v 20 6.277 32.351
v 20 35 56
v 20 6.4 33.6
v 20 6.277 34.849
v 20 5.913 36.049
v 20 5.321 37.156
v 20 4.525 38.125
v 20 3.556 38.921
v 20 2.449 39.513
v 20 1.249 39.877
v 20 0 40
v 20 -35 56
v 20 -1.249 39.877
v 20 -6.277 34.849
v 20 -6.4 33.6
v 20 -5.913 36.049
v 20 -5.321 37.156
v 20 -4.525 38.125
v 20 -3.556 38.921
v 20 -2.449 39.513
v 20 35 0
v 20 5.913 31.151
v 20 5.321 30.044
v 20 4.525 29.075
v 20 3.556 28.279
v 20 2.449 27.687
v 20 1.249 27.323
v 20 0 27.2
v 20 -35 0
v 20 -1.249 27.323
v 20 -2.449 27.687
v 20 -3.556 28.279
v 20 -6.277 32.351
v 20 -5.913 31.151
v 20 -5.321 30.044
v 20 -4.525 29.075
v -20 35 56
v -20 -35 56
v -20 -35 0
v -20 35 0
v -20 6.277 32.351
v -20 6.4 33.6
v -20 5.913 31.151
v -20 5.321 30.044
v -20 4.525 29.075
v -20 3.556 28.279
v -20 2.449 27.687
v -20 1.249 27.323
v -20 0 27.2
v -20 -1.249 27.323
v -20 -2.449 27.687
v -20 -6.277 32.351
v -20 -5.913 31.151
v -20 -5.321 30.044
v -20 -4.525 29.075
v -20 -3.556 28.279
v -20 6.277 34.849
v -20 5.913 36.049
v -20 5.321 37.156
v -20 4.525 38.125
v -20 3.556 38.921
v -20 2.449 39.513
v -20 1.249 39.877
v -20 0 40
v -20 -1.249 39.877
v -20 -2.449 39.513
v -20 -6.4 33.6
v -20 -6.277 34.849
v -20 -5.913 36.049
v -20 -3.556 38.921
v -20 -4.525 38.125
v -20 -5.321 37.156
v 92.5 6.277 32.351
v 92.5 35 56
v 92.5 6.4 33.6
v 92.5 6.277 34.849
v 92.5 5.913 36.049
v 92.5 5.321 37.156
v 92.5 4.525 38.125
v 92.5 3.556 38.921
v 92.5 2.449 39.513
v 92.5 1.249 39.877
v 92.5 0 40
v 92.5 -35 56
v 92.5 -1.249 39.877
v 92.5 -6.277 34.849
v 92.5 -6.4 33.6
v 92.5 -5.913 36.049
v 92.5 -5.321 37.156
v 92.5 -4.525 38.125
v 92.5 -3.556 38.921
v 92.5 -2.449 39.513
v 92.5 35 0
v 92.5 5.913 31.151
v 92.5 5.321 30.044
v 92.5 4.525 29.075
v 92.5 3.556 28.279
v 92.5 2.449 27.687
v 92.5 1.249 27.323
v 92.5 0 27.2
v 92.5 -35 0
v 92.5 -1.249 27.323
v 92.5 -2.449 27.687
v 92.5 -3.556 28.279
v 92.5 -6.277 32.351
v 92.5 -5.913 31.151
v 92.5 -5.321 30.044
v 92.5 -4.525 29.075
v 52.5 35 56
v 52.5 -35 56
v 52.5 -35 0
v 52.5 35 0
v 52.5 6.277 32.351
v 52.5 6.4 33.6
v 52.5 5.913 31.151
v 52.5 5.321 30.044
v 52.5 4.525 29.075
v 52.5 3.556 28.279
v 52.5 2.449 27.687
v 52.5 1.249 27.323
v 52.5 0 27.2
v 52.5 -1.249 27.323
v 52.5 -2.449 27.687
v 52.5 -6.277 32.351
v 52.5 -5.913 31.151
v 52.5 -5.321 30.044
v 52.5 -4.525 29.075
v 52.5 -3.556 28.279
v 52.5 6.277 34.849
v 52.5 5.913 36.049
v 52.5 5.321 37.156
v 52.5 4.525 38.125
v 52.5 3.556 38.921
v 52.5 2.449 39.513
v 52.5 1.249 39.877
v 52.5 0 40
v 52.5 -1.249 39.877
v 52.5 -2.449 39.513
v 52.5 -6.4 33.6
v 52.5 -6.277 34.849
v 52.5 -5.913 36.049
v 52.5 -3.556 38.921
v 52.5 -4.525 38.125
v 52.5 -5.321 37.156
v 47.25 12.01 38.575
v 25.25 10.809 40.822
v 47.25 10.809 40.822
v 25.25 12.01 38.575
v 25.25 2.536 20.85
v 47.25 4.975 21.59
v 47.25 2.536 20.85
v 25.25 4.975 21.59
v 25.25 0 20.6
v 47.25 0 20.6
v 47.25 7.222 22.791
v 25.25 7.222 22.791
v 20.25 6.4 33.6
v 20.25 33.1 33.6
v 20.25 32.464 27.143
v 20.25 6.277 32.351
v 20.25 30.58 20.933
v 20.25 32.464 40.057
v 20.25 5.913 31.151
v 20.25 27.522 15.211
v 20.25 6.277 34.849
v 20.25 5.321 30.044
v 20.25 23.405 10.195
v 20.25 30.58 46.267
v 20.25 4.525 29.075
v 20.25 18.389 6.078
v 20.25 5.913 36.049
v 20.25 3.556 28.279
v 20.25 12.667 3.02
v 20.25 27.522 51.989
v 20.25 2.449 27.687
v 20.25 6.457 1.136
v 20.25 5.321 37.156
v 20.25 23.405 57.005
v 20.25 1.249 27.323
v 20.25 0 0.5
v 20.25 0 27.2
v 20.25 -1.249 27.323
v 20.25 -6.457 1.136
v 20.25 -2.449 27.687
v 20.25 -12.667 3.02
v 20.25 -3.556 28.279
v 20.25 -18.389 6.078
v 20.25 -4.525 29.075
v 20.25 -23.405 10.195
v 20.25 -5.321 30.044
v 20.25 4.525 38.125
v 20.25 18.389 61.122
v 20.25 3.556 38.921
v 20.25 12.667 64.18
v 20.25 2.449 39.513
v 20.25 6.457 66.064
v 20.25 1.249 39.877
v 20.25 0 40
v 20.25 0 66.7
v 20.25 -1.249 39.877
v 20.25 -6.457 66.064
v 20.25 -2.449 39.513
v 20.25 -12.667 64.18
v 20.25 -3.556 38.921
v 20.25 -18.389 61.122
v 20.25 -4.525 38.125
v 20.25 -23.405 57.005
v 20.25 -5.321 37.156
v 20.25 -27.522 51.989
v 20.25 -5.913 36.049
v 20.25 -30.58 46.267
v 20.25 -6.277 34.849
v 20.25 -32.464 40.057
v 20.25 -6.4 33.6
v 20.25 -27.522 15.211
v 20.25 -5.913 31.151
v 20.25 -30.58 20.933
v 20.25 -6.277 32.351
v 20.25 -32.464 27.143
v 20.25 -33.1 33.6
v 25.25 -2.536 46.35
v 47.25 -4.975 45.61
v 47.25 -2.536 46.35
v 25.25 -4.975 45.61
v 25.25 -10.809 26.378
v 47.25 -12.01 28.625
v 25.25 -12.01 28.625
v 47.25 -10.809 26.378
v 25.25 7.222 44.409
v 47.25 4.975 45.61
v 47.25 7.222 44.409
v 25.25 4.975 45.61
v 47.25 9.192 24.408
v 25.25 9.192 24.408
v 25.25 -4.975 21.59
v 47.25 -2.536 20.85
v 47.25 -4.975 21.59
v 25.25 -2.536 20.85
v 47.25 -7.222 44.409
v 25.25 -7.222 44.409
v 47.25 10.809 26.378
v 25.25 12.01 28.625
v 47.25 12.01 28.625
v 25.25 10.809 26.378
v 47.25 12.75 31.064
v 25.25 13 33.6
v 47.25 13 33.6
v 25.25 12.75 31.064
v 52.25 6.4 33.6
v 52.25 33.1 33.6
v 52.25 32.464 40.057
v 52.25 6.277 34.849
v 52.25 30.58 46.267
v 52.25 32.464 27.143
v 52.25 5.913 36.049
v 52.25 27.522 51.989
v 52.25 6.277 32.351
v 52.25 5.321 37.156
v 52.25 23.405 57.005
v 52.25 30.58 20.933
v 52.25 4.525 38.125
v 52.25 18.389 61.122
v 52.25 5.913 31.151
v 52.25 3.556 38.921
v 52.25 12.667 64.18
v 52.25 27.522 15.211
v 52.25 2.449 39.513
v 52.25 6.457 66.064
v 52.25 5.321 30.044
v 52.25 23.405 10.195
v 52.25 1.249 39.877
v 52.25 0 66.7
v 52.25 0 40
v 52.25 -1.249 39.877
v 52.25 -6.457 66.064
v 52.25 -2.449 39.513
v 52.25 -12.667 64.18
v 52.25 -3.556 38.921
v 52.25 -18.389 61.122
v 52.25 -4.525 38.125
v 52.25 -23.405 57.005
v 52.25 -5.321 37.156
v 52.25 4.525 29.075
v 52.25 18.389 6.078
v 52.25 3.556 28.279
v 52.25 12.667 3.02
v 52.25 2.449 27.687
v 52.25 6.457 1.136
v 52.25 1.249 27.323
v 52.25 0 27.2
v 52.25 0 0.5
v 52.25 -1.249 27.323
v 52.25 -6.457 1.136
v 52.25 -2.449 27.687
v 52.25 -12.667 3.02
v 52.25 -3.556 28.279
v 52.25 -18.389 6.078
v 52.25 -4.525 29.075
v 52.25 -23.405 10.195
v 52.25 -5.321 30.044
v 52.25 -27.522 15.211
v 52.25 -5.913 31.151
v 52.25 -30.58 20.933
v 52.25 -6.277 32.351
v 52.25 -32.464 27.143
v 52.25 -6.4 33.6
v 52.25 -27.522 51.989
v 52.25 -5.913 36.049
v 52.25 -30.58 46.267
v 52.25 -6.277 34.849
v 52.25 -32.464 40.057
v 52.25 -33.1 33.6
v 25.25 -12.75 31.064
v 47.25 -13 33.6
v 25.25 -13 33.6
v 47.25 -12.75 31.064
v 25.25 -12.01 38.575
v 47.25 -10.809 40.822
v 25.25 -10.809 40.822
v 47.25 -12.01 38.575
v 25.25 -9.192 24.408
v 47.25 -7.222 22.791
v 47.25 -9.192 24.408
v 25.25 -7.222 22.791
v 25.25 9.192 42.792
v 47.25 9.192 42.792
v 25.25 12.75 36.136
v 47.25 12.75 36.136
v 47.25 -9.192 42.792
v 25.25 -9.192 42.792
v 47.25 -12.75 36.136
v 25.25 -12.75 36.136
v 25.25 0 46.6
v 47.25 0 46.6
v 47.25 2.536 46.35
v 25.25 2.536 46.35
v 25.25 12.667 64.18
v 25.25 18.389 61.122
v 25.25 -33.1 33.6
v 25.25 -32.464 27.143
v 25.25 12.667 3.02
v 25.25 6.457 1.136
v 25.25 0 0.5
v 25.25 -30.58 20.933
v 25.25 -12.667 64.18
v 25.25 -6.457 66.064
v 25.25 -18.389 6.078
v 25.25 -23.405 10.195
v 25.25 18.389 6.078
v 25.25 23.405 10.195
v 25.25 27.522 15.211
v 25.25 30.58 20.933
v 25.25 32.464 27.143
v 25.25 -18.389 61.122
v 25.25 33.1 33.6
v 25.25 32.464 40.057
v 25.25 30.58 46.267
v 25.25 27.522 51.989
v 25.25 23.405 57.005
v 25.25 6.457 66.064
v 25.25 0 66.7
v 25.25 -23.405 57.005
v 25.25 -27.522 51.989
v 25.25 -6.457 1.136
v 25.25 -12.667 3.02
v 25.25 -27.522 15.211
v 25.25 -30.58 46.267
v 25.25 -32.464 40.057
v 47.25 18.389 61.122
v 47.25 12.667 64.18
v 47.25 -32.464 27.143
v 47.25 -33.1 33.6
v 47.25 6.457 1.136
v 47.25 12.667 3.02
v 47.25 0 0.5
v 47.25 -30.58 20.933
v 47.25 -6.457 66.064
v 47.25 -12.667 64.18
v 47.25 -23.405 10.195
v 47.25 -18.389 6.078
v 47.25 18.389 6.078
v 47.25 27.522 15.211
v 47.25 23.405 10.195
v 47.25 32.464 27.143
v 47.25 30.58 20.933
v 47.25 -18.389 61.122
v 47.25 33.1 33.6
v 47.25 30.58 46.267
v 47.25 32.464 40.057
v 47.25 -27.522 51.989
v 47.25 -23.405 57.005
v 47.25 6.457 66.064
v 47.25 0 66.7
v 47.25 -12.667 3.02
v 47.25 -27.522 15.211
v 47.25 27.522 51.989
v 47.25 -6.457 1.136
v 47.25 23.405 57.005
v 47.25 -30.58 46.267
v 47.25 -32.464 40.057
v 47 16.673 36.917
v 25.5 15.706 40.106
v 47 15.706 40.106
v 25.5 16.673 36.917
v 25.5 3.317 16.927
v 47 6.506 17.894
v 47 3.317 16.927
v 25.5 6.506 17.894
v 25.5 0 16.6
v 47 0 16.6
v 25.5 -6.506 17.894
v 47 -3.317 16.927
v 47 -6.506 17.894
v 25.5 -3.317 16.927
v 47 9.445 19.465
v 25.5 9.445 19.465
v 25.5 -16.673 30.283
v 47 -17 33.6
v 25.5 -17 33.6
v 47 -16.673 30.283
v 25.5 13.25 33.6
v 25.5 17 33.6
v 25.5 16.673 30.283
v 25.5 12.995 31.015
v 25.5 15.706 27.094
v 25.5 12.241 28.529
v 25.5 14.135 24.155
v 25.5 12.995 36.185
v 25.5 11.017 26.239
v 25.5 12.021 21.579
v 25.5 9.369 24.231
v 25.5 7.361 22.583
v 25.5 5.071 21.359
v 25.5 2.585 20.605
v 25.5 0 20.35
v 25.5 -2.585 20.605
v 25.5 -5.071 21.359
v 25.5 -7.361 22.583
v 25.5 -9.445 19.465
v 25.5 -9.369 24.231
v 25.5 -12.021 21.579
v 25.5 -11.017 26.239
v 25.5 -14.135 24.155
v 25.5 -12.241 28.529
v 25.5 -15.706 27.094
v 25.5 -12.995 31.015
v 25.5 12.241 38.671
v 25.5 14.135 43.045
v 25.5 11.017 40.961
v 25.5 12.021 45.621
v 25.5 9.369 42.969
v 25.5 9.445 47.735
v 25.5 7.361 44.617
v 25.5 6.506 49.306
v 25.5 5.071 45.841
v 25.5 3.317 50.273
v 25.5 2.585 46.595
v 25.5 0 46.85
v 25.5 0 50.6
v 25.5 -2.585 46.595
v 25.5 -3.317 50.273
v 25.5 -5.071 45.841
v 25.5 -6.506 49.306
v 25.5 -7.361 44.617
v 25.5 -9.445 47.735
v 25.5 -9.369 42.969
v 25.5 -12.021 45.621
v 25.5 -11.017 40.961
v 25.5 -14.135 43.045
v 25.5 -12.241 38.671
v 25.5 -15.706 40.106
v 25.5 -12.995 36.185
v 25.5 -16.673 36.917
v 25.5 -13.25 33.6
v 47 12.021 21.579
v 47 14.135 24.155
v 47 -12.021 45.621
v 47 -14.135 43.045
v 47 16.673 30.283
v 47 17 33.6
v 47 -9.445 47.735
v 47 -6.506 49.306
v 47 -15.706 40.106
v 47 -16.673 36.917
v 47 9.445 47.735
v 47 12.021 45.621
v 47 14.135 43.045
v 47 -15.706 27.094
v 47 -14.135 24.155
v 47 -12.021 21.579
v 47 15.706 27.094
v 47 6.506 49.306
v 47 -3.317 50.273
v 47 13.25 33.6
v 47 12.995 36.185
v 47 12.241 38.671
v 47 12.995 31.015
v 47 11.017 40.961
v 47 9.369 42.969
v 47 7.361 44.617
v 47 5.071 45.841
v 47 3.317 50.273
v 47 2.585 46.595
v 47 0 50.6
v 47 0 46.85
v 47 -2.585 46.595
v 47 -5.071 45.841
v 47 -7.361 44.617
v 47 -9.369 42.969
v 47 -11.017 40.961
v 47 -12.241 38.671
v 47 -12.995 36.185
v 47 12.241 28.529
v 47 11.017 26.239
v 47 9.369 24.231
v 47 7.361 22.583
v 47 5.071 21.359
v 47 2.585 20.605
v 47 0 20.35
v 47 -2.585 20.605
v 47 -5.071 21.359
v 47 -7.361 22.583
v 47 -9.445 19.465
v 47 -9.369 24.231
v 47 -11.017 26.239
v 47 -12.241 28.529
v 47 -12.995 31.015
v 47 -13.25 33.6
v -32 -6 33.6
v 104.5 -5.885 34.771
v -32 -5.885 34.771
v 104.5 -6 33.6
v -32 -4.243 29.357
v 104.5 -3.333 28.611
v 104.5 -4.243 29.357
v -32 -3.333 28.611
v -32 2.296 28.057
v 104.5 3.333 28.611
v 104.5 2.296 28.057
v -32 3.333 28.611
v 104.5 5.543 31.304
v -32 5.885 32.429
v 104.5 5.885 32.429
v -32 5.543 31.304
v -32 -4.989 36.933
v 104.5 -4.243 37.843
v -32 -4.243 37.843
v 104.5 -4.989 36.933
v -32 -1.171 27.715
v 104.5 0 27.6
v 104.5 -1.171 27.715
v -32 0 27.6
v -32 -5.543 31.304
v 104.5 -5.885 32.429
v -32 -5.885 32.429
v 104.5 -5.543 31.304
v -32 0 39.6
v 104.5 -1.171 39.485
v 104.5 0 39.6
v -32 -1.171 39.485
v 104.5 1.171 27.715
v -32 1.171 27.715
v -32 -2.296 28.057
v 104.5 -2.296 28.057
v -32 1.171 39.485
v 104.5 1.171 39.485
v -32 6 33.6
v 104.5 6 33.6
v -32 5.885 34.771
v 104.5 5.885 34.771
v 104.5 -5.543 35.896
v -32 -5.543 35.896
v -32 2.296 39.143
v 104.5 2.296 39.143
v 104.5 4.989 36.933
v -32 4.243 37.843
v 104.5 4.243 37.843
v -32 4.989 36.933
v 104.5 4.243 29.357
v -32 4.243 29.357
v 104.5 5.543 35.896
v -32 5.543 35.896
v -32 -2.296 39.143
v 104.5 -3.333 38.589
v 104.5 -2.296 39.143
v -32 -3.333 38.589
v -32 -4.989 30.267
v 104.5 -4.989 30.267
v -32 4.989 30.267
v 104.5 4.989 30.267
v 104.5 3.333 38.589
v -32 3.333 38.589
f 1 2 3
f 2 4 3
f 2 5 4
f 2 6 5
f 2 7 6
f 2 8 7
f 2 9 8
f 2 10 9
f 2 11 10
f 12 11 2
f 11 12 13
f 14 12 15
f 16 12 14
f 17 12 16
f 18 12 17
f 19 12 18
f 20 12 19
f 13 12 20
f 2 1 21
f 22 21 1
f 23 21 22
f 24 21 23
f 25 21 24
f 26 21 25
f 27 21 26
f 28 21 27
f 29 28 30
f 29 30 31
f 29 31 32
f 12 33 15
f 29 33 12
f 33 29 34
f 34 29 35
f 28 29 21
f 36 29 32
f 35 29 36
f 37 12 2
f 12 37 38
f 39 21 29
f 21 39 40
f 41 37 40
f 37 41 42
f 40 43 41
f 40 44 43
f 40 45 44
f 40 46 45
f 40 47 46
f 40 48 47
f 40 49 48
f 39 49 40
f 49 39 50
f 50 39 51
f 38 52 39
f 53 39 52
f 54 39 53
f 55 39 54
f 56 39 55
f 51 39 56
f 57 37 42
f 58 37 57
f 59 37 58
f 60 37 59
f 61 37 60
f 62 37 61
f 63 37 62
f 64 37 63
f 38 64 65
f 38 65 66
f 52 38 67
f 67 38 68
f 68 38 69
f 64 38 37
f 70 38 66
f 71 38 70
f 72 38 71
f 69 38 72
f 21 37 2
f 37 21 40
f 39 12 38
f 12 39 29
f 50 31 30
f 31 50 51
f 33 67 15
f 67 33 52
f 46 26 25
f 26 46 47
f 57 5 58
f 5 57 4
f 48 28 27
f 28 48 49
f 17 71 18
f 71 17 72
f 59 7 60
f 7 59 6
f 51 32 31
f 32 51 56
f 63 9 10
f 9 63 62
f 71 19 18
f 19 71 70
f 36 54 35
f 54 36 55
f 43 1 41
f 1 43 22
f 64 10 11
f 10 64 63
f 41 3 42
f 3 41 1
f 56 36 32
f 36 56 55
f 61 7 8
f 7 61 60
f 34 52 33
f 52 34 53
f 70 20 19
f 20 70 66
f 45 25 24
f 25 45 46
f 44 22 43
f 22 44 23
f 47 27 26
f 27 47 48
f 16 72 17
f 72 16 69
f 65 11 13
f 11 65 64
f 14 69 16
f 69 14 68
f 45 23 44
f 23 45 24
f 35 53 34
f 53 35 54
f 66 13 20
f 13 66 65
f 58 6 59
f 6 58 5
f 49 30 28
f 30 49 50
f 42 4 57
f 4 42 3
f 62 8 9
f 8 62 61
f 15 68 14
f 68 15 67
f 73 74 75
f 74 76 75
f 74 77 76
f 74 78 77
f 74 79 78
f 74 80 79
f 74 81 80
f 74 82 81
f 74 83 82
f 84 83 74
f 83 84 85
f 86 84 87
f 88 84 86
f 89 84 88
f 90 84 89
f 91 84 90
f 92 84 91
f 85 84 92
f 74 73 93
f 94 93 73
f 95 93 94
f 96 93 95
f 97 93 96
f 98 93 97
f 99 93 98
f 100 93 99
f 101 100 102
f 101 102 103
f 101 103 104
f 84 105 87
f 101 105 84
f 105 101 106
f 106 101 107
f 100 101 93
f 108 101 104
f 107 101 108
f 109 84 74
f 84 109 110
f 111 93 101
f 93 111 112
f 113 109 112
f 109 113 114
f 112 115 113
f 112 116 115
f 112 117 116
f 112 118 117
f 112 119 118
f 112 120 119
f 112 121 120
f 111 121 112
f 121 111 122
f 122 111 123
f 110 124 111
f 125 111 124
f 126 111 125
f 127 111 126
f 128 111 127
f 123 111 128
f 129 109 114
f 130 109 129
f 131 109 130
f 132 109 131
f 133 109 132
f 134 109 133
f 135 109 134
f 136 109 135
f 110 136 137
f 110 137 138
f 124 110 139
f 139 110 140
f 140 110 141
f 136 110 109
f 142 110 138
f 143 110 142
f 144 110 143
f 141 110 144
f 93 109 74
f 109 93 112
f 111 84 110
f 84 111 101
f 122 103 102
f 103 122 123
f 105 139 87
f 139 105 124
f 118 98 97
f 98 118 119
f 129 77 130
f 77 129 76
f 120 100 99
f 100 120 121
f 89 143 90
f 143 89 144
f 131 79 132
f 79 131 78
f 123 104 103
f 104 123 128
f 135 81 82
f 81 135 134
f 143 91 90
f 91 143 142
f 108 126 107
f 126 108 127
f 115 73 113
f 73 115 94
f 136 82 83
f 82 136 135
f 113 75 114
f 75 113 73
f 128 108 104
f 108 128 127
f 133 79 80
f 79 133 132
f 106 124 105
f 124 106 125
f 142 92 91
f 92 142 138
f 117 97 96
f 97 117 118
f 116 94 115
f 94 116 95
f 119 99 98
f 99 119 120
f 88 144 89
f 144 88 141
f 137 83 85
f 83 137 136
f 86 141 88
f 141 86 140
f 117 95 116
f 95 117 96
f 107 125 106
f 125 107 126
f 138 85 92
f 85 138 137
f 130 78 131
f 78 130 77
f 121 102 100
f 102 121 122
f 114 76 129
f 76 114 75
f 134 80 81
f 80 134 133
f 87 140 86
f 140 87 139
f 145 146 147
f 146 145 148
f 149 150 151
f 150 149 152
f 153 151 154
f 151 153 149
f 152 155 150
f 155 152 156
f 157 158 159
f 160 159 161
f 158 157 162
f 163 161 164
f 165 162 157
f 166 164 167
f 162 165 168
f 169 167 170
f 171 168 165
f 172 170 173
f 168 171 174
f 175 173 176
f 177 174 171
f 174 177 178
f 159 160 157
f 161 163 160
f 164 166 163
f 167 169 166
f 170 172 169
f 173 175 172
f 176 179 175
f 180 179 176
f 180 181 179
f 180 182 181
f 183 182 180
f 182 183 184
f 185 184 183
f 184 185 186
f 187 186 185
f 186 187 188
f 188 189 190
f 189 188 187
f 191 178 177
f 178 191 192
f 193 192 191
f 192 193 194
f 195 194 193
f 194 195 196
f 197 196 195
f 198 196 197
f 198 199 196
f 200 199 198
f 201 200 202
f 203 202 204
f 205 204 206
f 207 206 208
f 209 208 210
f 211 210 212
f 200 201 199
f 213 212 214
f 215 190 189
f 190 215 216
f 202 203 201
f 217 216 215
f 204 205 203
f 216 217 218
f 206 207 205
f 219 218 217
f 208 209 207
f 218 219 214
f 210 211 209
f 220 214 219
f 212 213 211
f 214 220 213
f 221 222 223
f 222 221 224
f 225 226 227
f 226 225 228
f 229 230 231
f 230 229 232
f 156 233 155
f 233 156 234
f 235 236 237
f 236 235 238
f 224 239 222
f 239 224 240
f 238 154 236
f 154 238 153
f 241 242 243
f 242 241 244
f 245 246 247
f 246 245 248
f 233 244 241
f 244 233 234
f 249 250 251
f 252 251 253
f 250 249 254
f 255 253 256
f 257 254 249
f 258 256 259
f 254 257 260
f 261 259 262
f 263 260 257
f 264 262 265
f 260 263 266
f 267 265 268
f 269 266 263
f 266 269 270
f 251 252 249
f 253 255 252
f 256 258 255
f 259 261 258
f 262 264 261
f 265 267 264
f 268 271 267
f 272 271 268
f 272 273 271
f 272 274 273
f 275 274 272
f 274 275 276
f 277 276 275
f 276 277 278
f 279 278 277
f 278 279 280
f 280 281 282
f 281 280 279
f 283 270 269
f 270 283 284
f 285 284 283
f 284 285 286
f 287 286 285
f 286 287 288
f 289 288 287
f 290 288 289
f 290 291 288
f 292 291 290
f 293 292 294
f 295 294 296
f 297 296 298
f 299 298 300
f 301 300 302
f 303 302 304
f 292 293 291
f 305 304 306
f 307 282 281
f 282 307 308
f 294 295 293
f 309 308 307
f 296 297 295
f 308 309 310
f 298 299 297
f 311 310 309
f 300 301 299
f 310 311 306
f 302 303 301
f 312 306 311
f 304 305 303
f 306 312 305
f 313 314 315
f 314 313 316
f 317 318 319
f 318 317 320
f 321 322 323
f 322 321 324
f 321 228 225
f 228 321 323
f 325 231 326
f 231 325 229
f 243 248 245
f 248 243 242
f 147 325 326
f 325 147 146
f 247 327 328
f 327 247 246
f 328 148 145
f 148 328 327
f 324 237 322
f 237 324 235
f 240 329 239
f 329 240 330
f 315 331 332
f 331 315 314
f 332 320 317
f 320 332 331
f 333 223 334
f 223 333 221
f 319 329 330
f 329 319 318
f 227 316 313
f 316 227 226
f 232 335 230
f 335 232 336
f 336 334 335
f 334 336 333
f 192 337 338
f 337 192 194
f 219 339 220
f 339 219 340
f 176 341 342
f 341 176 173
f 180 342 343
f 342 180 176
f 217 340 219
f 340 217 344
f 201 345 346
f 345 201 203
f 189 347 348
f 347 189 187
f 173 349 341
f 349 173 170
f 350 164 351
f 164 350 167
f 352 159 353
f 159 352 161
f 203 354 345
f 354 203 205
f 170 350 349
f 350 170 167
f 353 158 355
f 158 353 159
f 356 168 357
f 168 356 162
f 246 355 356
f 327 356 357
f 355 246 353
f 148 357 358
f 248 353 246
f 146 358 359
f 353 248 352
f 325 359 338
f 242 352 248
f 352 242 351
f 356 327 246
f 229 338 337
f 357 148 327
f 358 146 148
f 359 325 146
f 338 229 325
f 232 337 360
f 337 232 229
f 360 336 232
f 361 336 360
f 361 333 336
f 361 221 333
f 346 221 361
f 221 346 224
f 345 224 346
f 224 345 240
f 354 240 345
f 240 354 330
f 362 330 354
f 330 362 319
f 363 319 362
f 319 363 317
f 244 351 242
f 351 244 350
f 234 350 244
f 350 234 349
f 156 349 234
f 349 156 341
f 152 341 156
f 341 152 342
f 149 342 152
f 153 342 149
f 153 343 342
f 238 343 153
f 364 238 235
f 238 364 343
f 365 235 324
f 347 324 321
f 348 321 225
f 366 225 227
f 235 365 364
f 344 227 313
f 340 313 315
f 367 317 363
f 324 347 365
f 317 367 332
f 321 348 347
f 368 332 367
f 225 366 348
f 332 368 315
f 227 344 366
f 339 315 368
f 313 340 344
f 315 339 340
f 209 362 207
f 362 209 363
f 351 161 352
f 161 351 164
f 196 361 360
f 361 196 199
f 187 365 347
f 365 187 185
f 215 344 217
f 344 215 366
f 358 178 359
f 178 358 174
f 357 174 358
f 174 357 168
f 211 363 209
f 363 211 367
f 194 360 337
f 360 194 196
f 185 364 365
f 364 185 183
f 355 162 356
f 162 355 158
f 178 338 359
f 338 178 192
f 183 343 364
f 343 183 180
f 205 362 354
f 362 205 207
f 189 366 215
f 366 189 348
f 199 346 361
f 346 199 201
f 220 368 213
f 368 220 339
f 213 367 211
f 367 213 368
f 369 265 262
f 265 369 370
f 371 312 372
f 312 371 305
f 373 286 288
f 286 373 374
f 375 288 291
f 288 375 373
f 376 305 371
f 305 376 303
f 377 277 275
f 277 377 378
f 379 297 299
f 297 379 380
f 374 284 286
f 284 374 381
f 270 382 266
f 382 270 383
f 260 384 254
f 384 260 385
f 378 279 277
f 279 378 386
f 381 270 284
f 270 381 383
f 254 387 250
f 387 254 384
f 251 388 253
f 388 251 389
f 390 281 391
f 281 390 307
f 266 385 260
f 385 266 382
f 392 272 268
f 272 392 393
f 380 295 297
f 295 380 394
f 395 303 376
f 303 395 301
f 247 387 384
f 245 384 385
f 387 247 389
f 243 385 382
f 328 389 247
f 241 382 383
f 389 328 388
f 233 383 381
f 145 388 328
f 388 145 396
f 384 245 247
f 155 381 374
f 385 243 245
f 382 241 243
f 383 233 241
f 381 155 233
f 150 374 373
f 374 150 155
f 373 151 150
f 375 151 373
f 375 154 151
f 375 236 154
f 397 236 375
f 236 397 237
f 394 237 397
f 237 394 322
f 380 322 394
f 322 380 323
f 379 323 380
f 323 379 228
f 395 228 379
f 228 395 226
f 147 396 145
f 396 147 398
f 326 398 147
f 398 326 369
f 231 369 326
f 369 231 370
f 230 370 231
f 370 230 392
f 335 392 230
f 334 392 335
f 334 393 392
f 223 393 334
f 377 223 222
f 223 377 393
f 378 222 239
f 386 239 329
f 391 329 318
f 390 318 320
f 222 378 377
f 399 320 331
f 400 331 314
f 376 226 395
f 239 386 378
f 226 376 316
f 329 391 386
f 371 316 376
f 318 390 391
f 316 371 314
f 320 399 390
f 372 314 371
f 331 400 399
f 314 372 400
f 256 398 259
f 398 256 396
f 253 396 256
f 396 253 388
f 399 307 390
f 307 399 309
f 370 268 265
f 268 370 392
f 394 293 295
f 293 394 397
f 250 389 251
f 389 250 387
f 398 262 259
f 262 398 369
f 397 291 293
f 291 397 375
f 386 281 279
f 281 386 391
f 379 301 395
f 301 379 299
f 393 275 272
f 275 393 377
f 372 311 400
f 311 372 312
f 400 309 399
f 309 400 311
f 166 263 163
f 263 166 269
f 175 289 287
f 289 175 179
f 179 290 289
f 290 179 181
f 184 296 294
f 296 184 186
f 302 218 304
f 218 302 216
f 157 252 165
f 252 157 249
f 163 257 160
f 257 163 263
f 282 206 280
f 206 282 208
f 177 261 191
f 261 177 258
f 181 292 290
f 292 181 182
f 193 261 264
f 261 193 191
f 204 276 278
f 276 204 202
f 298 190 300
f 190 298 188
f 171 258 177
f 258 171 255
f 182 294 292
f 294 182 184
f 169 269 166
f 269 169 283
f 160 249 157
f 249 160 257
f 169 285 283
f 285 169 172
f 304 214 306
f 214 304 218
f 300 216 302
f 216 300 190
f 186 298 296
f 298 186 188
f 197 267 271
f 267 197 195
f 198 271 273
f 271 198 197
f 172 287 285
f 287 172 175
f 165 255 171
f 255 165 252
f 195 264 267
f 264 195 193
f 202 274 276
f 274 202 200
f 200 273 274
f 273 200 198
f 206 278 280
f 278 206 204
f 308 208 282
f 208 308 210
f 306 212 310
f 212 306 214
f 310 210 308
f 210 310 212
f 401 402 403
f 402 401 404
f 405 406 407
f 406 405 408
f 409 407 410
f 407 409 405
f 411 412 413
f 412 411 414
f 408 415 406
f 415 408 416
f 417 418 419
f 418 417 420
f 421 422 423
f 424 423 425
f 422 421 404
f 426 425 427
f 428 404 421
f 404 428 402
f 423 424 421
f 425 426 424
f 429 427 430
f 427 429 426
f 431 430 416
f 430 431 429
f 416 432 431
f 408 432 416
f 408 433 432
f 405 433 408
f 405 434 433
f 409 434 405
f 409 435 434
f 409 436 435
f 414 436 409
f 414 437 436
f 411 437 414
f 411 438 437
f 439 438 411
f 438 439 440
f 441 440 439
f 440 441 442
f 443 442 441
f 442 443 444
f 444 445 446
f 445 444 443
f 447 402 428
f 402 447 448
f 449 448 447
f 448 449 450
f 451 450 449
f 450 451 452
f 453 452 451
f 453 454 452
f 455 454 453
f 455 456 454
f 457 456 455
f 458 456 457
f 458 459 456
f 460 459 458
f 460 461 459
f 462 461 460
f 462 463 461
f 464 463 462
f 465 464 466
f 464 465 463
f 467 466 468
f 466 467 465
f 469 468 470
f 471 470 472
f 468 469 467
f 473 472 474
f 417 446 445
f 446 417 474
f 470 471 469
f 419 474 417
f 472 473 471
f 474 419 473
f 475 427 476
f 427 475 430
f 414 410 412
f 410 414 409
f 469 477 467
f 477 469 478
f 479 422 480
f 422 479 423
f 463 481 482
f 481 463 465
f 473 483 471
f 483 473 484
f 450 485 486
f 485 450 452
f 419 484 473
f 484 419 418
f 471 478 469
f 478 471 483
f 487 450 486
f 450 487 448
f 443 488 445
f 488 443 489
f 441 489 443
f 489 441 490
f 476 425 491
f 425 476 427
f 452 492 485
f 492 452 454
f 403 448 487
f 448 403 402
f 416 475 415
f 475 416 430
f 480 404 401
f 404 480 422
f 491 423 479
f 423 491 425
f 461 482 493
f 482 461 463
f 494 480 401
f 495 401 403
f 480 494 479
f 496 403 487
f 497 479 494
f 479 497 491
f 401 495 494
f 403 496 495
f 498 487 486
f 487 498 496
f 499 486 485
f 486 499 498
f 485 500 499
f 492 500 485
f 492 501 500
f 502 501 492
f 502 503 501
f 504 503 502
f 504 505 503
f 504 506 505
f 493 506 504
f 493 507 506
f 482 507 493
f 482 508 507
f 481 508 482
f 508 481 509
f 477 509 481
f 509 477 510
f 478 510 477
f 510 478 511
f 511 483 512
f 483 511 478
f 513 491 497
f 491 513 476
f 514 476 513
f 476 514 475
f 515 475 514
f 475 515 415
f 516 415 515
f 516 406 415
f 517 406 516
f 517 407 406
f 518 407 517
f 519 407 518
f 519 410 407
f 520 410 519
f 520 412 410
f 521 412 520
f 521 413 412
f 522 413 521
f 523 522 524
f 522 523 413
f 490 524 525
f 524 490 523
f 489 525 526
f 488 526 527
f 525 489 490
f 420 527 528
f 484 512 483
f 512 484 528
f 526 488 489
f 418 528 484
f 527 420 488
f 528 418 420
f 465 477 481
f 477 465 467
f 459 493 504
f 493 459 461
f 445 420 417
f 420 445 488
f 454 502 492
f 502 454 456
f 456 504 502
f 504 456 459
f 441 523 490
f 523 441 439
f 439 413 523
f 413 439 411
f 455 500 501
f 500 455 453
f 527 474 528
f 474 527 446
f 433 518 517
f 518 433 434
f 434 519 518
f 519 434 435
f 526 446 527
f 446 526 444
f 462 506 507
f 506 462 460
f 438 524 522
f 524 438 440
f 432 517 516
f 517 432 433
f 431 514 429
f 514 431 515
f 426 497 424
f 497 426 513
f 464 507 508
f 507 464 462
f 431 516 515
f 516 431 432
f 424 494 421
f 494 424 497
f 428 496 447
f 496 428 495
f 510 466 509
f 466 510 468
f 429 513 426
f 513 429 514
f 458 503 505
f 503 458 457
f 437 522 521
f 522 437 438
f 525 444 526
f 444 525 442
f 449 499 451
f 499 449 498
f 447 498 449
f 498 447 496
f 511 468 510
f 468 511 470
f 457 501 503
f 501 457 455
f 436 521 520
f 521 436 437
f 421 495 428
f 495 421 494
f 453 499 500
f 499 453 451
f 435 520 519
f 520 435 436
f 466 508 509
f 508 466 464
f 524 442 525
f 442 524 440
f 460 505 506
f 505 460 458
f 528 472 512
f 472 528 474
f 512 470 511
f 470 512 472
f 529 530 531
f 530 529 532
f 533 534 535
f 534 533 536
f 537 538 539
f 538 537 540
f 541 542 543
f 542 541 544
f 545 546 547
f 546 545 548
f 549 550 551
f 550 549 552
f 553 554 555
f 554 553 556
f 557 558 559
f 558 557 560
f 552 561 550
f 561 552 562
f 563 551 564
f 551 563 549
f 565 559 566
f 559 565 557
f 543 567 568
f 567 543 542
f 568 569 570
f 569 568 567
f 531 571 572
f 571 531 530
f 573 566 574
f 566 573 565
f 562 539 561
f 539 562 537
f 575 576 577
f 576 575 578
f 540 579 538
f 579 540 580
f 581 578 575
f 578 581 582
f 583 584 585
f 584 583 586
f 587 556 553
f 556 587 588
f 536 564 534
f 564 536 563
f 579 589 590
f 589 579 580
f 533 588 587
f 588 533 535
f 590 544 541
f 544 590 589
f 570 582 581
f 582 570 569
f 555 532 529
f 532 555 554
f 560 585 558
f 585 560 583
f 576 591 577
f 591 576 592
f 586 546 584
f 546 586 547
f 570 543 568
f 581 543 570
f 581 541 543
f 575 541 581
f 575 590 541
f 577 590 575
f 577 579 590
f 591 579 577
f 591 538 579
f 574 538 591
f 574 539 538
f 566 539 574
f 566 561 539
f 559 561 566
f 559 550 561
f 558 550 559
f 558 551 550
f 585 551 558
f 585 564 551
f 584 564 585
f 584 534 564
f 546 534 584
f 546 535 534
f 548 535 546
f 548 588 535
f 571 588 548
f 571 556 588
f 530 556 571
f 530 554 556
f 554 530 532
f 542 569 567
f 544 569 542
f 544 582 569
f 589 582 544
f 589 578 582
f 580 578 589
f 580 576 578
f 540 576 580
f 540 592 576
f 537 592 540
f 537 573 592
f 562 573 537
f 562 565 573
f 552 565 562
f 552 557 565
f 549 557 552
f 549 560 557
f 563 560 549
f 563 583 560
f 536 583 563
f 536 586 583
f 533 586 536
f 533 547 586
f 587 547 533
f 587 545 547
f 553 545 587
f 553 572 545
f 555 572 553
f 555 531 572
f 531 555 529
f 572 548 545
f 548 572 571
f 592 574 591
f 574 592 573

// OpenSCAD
$fn = 32;

// ------------------------------------------------------------------------
// Pulley assembly: d66.2 pulley with a belt, shaft d12
// Every part is its own module, assembly() places them once.
// ------------------------------------------------------------------------

// --- part 1 ---
module support1() {
  difference() {
    translate([-20, -35, 0]) cube([40, 70, 56]);
    translate([0, 0, 33.6]) rotate([0, 90, 0]) cylinder(h = 42, d = 12.8, center = true);
  }
}

// --- part 2 ---
module support2() {
  difference() {
    translate([-20, -35, 0]) cube([40, 70, 56]);
    translate([0, 0, 33.6]) rotate([0, 90, 0]) cylinder(h = 42, d = 12.8, center = true);
  }
}

// --- part 3 ---
module shaft() {
  translate([0, 0, -68.25]) cylinder(h = 136.5, d = 12);
}

// --- part 4 ---
module pulley() {
  difference() {
    union() {
      cylinder(h = 32, d = 26);
      cylinder(h = 5, d = 66.2);
      translate([0, 0, 27]) cylinder(h = 5, d = 66.2);
    }
    translate([0, 0, -1]) cylinder(h = 34, d = 12.8);
  }
}

// --- part 5 ---
module belt() {
  difference() {
      translate([0, 0, 0]) cylinder(h = 21.5, d = 34);
      translate([0, 0, -1]) cylinder(h = 23.5, d = 26.5);
    }
}

// --- assembly ---
module assembly() {
  translate([0, 0, 0]) rotate([0, 0, 0]) support1();
  translate([72.5, 0, 0]) rotate([0, 0, 0]) support2();
  translate([36.25, 0, 33.6]) rotate([0, 90, 0]) shaft();
  translate([20.25, 0, 33.6]) rotate([0, 90, 0]) pulley();
  translate([25.5, 0, 33.6]) rotate([0, 90, 0]) belt();
}

assembly();
